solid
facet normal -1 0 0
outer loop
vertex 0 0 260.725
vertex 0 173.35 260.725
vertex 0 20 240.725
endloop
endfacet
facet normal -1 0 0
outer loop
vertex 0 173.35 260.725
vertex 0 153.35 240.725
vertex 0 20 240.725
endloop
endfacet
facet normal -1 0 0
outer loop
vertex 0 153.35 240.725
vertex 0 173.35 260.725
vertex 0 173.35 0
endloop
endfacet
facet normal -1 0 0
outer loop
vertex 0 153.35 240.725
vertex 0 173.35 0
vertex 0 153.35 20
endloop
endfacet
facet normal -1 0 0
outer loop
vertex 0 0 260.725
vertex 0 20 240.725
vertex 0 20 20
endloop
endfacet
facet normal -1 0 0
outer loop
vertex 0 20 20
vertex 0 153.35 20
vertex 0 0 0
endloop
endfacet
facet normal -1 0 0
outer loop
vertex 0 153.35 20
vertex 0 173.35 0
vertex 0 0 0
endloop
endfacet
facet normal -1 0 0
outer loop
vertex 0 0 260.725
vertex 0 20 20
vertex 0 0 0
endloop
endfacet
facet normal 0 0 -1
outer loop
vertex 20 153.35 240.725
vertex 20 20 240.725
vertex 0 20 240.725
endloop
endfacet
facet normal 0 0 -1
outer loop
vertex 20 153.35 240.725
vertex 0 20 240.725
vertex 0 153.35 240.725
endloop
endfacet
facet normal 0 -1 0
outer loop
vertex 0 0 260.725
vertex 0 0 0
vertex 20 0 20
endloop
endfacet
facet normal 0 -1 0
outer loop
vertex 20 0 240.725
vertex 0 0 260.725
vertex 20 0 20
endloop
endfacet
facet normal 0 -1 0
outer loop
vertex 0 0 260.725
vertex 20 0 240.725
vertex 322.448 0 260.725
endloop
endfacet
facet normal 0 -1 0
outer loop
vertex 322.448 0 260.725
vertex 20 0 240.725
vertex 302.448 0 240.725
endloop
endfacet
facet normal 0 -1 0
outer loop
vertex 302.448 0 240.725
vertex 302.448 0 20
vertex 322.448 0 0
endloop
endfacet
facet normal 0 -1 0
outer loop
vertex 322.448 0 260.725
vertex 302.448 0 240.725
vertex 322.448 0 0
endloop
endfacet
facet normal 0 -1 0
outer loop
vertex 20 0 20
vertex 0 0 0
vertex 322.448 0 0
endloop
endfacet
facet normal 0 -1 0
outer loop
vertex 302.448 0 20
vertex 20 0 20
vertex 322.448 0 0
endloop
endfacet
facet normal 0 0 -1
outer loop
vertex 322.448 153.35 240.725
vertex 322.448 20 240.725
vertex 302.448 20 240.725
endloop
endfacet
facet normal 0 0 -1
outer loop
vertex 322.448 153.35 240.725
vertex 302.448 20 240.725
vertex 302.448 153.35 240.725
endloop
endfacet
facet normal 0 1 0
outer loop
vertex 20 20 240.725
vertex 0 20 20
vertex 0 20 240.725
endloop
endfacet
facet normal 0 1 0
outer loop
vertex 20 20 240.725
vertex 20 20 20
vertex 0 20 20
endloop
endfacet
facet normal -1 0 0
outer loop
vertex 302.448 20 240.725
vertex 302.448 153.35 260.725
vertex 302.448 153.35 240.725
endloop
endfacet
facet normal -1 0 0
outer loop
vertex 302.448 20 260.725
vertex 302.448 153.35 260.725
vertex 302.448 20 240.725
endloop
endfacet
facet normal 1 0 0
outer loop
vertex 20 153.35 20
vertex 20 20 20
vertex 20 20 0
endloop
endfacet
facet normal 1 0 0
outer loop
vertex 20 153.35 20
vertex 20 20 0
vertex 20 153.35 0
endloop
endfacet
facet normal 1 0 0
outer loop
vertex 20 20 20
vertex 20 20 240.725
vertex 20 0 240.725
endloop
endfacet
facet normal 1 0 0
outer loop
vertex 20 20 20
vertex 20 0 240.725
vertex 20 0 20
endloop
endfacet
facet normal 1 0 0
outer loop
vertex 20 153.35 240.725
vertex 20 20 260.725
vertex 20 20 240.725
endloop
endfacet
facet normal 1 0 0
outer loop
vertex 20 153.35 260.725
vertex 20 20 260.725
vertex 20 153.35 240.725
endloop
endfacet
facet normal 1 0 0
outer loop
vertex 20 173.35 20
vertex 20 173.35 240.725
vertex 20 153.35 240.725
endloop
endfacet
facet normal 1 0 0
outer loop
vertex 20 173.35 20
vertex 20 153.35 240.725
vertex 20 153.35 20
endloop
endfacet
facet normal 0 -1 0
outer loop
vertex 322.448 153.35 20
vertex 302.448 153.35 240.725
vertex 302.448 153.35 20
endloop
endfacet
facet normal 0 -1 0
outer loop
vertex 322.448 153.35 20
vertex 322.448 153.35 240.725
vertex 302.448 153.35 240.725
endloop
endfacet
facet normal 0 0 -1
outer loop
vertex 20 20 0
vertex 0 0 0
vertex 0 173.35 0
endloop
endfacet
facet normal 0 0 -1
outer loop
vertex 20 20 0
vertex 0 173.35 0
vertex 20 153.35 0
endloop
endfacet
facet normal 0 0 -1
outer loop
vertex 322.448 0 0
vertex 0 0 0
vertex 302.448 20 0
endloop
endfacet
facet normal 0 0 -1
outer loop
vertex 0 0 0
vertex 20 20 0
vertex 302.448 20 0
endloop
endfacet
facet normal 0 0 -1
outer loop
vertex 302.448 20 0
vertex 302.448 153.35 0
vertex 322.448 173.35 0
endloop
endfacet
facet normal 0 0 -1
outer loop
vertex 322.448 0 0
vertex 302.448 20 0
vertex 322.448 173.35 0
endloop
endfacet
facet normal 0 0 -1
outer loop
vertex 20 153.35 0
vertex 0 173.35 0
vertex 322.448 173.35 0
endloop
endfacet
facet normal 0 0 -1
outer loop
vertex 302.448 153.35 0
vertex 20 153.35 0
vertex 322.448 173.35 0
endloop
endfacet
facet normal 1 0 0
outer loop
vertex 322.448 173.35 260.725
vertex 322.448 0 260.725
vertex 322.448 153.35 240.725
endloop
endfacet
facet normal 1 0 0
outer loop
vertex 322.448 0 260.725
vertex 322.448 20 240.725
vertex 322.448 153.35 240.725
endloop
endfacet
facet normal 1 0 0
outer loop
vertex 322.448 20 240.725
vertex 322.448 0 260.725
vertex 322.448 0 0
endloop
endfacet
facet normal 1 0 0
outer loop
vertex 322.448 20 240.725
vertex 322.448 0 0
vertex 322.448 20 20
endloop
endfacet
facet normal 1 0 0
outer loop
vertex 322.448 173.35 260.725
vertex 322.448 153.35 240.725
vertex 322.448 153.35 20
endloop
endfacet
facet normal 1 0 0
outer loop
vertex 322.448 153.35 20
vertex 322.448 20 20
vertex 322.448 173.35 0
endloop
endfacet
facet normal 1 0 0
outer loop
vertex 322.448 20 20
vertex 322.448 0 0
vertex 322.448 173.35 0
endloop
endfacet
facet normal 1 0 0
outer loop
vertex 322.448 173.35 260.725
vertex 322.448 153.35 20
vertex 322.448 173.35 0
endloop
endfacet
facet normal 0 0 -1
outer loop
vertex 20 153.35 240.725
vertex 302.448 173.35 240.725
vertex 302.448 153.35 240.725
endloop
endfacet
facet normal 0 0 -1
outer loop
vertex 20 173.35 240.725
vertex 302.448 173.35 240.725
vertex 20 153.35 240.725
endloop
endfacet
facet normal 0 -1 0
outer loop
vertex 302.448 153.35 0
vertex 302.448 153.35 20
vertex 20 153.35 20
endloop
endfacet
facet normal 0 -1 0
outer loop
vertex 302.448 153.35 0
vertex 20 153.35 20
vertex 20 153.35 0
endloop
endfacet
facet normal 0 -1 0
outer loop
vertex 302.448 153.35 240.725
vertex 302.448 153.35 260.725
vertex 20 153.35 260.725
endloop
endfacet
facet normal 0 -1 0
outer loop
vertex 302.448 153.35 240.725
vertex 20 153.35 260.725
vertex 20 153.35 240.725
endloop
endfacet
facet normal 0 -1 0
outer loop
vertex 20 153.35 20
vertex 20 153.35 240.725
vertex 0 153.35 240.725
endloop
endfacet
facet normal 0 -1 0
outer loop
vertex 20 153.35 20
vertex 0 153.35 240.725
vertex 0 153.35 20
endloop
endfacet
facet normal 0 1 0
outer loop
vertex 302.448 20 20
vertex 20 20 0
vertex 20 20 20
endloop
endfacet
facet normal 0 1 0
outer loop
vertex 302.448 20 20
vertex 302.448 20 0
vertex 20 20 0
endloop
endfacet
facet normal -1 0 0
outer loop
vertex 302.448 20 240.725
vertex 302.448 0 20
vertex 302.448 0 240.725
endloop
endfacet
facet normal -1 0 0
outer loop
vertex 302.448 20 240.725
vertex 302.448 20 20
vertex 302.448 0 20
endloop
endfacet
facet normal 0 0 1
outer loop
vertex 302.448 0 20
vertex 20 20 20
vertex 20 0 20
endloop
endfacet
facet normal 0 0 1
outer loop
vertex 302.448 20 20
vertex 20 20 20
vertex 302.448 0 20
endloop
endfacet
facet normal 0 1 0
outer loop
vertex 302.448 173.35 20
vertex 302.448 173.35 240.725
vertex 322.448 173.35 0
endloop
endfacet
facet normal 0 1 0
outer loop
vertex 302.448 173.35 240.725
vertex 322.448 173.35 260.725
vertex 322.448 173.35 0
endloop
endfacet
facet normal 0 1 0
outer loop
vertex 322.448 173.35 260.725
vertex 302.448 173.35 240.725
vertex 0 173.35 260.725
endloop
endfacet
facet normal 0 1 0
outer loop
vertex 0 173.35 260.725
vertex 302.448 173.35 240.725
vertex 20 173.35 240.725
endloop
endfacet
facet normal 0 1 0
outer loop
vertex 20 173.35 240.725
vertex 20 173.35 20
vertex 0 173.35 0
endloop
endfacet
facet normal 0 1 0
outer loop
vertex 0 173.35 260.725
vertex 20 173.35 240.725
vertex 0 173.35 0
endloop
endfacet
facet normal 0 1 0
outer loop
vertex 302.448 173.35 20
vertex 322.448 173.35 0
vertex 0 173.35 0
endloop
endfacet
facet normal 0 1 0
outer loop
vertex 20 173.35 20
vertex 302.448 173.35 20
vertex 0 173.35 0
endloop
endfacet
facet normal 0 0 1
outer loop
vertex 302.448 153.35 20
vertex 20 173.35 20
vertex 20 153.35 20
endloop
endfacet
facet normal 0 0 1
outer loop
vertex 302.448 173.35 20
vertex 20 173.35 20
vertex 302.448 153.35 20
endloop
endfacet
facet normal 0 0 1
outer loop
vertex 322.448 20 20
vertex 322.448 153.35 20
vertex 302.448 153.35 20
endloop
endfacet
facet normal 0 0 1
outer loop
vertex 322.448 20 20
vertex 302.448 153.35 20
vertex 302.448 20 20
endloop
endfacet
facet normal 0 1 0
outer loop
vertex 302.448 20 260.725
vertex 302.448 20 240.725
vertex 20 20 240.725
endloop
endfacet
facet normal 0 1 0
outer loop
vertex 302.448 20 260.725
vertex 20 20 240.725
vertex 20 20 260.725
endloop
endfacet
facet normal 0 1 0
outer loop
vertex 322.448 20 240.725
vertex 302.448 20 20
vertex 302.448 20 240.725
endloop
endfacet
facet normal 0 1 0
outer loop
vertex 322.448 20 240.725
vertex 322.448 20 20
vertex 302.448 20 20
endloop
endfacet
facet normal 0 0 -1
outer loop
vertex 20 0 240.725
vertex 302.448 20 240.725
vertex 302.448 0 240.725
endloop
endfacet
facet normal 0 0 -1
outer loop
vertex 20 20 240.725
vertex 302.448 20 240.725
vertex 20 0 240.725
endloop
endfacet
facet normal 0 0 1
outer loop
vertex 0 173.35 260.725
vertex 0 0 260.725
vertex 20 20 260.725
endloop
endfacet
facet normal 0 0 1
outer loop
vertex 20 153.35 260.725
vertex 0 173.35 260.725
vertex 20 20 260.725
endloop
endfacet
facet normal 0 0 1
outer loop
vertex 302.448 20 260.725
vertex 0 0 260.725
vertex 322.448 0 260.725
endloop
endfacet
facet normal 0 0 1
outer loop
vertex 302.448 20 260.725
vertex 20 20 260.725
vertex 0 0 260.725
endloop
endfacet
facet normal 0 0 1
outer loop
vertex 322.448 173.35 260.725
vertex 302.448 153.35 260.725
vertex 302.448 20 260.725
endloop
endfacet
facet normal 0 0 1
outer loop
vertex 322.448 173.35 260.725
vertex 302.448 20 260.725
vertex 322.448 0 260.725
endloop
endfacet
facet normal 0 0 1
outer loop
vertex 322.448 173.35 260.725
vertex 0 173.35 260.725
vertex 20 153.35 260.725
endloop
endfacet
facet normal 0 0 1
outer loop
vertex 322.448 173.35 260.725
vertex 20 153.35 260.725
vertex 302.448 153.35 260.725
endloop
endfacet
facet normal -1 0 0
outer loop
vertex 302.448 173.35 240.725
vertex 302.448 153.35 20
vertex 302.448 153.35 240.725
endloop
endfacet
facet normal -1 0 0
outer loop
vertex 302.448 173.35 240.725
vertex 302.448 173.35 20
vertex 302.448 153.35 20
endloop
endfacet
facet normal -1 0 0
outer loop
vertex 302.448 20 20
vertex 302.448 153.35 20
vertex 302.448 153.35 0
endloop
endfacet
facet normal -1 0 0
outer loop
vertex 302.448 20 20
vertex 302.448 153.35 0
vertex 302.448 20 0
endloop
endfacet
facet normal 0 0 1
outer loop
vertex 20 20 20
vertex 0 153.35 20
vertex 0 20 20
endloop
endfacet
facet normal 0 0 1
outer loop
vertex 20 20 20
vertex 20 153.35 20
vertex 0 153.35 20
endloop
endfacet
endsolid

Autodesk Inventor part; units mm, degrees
ref_plane "YZ Plane" through (0, 0, 0) normal (1, 0, 0) x (0, 1, 0)
ref_plane "XZ Plane" through (0, 0, 0) normal (0, 1, 0) x (-1, 0, 0)
ref_plane "XY Plane" through (0, 0, 0) normal (0, 0, 1) x (1, 0, 0)
sketch "Sketch1" plane through (0, 0, 0) normal (0, 0, 1) x (1, 0, 0)
  line L0 (0, 0) -> (322.448, 0)
  line L1 (322.448, 0) -> (322.448, 173.35)
  line L2 (322.448, 173.35) -> (0, 173.35)
  line L3 (0, 173.35) -> (0, 0)
  dimension "d0" = 322.448
  dimension "d1" = 173.35
extrude "Extrusion1" add sketch "Sketch1" along normal blind 260.725
sketch "Sketch2" plane through (0, 0, 260.725) normal (0, 0, 1) x (1, 0, 0)
  line L0 (20, 153.35) -> (302.448, 153.35)
  line L1 (302.448, 153.35) -> (302.448, 20)
  line L2 (302.448, 20) -> (20, 20)
  line L3 (20, 20) -> (20, 153.35)
  line L4 (322.448, 173.35) -> (0, 173.35) projected
  line L5 (0, 173.35) -> (0, 0) projected
  line L6 (0, 0) -> (322.448, 0) projected
  line L7 (322.448, 0) -> (322.448, 173.35) projected
  dimension "d4" = 20
  dimension "d5" = 20
  dimension "d6" = 20
  dimension "d7" = 20
extrude "Extrusion2" cut sketch "Sketch2" against normal blind 900 contours L0 L1 L2 L3
sketch "Sketch3" plane through (322.448, 0, 0) normal (1, 0, 0) x (0, 0, -1)
  line L0 (-240.725, 153.35) -> (-20, 153.35)
  line L1 (-20, 153.35) -> (-20, 20)
  line L2 (-20, 20) -> (-240.725, 20)
  line L3 (-240.725, 20) -> (-240.725, 153.35)
  line L4 (0, 173.35) -> (-260.725, 173.35) projected
  line L5 (-260.725, 0) -> (-260.725, 173.35) projected
  line L6 (0, 0) -> (-260.725, 0) projected
  line L7 (0, 0) -> (0, 173.35) projected
  dimension "d10" = 20
  dimension "d11" = 20
  dimension "d12" = 20
  dimension "d13" = 20
extrude "Extrusion3" cut sketch "Sketch3" against normal blind 900 contours L0 L1 L2 L3
sketch "Sketch4" plane through (0, 173.35, 0) normal (0, 1, 0) x (1, 0, 0)
  line L0 (20, -20) -> (302.448, -20)
  line L1 (302.448, -20) -> (302.448, -240.725)
  line L2 (302.448, -240.725) -> (20, -240.725)
  line L3 (20, -240.725) -> (20, -20)
  line L4 (322.448, 0) -> (0, 0) projected
  line L5 (0, 0) -> (0, -260.725) projected
  line L6 (322.448, 0) -> (322.448, -260.725) projected
  line L7 (322.448, -260.725) -> (0, -260.725) projected
  dimension "d16" = 20
  dimension "d17" = 20
  dimension "d18" = 20
  dimension "d19" = 20
extrude "Extrusion4" cut sketch "Sketch4" against normal blind 900 contours L0 L1 L2 L3
properties part number "Turning motor housing"
